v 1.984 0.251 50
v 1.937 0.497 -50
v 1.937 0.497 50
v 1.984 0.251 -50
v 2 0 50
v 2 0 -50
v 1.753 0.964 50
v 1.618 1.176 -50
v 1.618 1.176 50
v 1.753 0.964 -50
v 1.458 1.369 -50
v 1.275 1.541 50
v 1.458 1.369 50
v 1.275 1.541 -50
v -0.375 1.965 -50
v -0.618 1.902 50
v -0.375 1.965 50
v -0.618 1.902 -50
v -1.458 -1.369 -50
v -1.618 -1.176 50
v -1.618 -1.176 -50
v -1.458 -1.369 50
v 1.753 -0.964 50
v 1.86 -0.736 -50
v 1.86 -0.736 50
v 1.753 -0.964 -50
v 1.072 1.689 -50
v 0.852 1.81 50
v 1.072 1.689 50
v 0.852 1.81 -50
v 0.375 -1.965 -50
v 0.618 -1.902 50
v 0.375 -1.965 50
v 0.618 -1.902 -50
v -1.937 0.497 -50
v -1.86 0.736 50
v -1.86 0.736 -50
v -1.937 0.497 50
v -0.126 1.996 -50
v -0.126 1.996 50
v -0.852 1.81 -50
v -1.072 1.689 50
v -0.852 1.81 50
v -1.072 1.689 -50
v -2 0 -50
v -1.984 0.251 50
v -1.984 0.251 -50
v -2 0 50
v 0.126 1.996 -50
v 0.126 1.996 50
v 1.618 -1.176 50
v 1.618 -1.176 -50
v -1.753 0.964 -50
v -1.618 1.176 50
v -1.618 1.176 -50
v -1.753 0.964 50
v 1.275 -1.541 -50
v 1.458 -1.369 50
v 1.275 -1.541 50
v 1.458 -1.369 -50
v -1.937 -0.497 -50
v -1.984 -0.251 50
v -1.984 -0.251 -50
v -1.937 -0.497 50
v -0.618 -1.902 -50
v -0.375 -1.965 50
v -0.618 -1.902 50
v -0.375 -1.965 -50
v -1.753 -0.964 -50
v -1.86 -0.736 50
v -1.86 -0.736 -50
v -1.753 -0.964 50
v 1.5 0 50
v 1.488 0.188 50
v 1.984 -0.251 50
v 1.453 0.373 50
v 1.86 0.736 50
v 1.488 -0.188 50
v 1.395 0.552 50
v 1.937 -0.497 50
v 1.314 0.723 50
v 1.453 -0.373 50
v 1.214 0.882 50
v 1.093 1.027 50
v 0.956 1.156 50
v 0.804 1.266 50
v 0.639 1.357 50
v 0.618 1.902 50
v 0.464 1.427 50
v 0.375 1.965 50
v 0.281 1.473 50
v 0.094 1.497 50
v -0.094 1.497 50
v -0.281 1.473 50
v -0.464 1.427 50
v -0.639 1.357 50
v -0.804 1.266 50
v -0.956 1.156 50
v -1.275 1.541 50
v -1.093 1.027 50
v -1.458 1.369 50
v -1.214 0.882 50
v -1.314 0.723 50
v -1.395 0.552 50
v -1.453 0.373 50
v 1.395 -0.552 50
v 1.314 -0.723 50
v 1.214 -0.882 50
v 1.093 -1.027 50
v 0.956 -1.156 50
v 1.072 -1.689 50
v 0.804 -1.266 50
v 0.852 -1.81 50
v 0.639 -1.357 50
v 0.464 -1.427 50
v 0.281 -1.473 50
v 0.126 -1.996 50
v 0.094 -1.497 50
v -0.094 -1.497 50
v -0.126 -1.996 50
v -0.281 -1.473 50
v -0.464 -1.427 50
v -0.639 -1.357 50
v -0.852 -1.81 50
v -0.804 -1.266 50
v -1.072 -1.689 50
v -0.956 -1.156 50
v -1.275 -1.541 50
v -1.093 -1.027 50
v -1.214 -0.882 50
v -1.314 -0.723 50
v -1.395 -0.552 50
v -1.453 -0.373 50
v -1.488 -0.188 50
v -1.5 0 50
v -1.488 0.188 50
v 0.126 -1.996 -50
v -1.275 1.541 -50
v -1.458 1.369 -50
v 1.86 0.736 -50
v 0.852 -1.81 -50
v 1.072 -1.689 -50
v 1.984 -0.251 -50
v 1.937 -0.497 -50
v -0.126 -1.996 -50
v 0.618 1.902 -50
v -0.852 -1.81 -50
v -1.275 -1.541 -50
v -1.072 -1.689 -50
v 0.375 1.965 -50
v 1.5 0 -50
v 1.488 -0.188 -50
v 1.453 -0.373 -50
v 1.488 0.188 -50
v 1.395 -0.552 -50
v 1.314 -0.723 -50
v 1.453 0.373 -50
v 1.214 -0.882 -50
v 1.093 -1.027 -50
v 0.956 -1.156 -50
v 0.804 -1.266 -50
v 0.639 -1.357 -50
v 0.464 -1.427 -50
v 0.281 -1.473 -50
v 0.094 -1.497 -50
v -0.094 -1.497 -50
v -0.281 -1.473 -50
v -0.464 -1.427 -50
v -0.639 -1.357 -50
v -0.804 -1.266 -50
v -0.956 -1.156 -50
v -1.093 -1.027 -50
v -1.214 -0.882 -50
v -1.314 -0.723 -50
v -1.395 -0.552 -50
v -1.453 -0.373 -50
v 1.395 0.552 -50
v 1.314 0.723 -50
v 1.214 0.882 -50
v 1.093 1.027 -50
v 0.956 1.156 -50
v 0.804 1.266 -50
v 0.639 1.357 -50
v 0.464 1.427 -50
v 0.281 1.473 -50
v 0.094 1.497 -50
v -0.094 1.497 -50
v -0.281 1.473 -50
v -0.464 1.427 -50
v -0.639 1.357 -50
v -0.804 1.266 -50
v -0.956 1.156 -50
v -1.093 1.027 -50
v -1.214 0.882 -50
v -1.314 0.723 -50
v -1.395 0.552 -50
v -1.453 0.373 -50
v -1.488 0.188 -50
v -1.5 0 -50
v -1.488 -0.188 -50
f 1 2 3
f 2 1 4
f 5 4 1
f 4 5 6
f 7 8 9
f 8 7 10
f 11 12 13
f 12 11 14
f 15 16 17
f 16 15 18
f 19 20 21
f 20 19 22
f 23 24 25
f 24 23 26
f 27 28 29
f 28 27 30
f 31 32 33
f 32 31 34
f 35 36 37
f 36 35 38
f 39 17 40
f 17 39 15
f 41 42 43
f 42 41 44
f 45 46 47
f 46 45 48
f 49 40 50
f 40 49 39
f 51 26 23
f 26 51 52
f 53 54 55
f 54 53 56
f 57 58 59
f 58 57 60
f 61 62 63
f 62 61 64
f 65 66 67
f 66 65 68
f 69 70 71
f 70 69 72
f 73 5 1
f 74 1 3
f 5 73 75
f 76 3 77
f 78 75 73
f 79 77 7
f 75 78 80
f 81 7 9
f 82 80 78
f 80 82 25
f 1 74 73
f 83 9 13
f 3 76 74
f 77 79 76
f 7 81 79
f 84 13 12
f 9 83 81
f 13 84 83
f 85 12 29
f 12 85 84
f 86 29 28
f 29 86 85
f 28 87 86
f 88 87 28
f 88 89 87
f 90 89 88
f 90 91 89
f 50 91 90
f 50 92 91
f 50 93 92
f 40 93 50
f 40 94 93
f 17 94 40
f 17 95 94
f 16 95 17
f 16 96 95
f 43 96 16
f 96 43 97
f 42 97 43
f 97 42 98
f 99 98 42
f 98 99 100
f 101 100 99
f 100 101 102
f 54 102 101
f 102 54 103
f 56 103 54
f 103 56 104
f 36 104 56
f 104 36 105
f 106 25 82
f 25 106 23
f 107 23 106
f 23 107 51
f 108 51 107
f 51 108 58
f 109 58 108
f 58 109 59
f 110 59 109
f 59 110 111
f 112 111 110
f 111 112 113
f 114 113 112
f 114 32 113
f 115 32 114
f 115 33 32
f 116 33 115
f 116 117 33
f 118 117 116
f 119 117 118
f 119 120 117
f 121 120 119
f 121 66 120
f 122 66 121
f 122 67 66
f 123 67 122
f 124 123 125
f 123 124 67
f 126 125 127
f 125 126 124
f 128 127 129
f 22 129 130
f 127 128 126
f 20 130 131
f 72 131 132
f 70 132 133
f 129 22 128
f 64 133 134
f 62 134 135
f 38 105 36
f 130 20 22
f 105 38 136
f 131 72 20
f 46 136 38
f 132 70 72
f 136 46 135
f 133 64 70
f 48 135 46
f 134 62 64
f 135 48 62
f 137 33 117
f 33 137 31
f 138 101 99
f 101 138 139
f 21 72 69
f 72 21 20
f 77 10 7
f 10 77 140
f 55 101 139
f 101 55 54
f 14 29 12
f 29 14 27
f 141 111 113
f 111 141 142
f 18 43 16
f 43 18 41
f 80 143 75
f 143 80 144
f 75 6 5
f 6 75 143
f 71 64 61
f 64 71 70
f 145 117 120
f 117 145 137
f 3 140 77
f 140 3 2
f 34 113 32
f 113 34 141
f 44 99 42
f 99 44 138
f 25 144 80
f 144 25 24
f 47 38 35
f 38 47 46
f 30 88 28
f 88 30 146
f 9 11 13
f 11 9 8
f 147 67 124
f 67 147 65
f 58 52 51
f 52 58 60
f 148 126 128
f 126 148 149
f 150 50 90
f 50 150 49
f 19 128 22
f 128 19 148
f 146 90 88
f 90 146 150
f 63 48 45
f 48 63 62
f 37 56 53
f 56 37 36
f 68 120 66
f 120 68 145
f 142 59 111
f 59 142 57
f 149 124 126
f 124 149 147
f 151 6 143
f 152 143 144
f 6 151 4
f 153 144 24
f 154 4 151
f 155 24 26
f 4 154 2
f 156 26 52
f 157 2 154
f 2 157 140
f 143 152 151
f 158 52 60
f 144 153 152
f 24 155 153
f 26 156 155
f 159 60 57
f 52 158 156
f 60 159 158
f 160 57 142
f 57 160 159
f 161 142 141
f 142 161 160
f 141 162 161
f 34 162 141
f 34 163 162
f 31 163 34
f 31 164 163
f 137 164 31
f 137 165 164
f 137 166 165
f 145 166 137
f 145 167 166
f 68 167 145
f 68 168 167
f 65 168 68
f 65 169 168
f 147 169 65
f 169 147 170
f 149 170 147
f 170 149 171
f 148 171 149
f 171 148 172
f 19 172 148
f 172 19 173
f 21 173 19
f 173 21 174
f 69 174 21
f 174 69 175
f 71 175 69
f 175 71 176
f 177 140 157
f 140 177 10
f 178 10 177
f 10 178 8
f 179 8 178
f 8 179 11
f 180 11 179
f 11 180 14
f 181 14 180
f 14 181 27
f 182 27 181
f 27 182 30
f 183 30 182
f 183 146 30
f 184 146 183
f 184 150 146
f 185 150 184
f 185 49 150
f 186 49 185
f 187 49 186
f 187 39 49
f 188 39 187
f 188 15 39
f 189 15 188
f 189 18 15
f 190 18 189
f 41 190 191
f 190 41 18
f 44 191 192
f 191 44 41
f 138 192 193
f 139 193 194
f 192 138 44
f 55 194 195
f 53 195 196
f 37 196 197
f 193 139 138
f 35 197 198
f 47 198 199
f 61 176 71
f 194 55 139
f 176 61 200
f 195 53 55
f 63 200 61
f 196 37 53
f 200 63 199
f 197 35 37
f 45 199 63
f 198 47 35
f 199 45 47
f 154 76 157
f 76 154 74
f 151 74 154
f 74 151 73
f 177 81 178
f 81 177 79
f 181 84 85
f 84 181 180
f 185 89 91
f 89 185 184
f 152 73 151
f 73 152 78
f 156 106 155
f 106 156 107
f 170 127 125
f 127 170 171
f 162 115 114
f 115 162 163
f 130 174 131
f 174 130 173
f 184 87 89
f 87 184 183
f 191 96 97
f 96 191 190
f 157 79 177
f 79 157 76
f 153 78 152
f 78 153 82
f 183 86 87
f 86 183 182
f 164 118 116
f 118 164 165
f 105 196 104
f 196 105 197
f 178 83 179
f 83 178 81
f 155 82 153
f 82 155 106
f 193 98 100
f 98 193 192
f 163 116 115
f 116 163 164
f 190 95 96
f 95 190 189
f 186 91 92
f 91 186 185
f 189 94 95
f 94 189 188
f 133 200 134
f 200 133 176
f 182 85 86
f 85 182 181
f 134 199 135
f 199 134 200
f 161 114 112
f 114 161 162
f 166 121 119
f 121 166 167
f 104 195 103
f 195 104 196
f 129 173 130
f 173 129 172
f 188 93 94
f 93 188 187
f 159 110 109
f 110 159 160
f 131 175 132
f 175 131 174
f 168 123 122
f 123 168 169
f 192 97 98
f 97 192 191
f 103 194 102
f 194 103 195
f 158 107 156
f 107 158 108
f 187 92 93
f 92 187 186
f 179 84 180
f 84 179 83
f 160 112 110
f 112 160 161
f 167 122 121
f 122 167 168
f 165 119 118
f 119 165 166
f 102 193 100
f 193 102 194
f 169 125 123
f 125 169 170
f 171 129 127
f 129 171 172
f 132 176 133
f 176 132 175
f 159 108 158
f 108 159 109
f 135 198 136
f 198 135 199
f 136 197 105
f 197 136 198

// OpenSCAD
$fn = 50;


difference() {
	union() {
		translate(v = [0, 0, -50.0000000000]) {
			cylinder(h = 100, r = 2.0000000000);
		}
	}
	union() {
		translate(v = [0, 0, -100.0000000000]) {
			cylinder(h = 200, r = 1.5000000000);
		}
	}
}
